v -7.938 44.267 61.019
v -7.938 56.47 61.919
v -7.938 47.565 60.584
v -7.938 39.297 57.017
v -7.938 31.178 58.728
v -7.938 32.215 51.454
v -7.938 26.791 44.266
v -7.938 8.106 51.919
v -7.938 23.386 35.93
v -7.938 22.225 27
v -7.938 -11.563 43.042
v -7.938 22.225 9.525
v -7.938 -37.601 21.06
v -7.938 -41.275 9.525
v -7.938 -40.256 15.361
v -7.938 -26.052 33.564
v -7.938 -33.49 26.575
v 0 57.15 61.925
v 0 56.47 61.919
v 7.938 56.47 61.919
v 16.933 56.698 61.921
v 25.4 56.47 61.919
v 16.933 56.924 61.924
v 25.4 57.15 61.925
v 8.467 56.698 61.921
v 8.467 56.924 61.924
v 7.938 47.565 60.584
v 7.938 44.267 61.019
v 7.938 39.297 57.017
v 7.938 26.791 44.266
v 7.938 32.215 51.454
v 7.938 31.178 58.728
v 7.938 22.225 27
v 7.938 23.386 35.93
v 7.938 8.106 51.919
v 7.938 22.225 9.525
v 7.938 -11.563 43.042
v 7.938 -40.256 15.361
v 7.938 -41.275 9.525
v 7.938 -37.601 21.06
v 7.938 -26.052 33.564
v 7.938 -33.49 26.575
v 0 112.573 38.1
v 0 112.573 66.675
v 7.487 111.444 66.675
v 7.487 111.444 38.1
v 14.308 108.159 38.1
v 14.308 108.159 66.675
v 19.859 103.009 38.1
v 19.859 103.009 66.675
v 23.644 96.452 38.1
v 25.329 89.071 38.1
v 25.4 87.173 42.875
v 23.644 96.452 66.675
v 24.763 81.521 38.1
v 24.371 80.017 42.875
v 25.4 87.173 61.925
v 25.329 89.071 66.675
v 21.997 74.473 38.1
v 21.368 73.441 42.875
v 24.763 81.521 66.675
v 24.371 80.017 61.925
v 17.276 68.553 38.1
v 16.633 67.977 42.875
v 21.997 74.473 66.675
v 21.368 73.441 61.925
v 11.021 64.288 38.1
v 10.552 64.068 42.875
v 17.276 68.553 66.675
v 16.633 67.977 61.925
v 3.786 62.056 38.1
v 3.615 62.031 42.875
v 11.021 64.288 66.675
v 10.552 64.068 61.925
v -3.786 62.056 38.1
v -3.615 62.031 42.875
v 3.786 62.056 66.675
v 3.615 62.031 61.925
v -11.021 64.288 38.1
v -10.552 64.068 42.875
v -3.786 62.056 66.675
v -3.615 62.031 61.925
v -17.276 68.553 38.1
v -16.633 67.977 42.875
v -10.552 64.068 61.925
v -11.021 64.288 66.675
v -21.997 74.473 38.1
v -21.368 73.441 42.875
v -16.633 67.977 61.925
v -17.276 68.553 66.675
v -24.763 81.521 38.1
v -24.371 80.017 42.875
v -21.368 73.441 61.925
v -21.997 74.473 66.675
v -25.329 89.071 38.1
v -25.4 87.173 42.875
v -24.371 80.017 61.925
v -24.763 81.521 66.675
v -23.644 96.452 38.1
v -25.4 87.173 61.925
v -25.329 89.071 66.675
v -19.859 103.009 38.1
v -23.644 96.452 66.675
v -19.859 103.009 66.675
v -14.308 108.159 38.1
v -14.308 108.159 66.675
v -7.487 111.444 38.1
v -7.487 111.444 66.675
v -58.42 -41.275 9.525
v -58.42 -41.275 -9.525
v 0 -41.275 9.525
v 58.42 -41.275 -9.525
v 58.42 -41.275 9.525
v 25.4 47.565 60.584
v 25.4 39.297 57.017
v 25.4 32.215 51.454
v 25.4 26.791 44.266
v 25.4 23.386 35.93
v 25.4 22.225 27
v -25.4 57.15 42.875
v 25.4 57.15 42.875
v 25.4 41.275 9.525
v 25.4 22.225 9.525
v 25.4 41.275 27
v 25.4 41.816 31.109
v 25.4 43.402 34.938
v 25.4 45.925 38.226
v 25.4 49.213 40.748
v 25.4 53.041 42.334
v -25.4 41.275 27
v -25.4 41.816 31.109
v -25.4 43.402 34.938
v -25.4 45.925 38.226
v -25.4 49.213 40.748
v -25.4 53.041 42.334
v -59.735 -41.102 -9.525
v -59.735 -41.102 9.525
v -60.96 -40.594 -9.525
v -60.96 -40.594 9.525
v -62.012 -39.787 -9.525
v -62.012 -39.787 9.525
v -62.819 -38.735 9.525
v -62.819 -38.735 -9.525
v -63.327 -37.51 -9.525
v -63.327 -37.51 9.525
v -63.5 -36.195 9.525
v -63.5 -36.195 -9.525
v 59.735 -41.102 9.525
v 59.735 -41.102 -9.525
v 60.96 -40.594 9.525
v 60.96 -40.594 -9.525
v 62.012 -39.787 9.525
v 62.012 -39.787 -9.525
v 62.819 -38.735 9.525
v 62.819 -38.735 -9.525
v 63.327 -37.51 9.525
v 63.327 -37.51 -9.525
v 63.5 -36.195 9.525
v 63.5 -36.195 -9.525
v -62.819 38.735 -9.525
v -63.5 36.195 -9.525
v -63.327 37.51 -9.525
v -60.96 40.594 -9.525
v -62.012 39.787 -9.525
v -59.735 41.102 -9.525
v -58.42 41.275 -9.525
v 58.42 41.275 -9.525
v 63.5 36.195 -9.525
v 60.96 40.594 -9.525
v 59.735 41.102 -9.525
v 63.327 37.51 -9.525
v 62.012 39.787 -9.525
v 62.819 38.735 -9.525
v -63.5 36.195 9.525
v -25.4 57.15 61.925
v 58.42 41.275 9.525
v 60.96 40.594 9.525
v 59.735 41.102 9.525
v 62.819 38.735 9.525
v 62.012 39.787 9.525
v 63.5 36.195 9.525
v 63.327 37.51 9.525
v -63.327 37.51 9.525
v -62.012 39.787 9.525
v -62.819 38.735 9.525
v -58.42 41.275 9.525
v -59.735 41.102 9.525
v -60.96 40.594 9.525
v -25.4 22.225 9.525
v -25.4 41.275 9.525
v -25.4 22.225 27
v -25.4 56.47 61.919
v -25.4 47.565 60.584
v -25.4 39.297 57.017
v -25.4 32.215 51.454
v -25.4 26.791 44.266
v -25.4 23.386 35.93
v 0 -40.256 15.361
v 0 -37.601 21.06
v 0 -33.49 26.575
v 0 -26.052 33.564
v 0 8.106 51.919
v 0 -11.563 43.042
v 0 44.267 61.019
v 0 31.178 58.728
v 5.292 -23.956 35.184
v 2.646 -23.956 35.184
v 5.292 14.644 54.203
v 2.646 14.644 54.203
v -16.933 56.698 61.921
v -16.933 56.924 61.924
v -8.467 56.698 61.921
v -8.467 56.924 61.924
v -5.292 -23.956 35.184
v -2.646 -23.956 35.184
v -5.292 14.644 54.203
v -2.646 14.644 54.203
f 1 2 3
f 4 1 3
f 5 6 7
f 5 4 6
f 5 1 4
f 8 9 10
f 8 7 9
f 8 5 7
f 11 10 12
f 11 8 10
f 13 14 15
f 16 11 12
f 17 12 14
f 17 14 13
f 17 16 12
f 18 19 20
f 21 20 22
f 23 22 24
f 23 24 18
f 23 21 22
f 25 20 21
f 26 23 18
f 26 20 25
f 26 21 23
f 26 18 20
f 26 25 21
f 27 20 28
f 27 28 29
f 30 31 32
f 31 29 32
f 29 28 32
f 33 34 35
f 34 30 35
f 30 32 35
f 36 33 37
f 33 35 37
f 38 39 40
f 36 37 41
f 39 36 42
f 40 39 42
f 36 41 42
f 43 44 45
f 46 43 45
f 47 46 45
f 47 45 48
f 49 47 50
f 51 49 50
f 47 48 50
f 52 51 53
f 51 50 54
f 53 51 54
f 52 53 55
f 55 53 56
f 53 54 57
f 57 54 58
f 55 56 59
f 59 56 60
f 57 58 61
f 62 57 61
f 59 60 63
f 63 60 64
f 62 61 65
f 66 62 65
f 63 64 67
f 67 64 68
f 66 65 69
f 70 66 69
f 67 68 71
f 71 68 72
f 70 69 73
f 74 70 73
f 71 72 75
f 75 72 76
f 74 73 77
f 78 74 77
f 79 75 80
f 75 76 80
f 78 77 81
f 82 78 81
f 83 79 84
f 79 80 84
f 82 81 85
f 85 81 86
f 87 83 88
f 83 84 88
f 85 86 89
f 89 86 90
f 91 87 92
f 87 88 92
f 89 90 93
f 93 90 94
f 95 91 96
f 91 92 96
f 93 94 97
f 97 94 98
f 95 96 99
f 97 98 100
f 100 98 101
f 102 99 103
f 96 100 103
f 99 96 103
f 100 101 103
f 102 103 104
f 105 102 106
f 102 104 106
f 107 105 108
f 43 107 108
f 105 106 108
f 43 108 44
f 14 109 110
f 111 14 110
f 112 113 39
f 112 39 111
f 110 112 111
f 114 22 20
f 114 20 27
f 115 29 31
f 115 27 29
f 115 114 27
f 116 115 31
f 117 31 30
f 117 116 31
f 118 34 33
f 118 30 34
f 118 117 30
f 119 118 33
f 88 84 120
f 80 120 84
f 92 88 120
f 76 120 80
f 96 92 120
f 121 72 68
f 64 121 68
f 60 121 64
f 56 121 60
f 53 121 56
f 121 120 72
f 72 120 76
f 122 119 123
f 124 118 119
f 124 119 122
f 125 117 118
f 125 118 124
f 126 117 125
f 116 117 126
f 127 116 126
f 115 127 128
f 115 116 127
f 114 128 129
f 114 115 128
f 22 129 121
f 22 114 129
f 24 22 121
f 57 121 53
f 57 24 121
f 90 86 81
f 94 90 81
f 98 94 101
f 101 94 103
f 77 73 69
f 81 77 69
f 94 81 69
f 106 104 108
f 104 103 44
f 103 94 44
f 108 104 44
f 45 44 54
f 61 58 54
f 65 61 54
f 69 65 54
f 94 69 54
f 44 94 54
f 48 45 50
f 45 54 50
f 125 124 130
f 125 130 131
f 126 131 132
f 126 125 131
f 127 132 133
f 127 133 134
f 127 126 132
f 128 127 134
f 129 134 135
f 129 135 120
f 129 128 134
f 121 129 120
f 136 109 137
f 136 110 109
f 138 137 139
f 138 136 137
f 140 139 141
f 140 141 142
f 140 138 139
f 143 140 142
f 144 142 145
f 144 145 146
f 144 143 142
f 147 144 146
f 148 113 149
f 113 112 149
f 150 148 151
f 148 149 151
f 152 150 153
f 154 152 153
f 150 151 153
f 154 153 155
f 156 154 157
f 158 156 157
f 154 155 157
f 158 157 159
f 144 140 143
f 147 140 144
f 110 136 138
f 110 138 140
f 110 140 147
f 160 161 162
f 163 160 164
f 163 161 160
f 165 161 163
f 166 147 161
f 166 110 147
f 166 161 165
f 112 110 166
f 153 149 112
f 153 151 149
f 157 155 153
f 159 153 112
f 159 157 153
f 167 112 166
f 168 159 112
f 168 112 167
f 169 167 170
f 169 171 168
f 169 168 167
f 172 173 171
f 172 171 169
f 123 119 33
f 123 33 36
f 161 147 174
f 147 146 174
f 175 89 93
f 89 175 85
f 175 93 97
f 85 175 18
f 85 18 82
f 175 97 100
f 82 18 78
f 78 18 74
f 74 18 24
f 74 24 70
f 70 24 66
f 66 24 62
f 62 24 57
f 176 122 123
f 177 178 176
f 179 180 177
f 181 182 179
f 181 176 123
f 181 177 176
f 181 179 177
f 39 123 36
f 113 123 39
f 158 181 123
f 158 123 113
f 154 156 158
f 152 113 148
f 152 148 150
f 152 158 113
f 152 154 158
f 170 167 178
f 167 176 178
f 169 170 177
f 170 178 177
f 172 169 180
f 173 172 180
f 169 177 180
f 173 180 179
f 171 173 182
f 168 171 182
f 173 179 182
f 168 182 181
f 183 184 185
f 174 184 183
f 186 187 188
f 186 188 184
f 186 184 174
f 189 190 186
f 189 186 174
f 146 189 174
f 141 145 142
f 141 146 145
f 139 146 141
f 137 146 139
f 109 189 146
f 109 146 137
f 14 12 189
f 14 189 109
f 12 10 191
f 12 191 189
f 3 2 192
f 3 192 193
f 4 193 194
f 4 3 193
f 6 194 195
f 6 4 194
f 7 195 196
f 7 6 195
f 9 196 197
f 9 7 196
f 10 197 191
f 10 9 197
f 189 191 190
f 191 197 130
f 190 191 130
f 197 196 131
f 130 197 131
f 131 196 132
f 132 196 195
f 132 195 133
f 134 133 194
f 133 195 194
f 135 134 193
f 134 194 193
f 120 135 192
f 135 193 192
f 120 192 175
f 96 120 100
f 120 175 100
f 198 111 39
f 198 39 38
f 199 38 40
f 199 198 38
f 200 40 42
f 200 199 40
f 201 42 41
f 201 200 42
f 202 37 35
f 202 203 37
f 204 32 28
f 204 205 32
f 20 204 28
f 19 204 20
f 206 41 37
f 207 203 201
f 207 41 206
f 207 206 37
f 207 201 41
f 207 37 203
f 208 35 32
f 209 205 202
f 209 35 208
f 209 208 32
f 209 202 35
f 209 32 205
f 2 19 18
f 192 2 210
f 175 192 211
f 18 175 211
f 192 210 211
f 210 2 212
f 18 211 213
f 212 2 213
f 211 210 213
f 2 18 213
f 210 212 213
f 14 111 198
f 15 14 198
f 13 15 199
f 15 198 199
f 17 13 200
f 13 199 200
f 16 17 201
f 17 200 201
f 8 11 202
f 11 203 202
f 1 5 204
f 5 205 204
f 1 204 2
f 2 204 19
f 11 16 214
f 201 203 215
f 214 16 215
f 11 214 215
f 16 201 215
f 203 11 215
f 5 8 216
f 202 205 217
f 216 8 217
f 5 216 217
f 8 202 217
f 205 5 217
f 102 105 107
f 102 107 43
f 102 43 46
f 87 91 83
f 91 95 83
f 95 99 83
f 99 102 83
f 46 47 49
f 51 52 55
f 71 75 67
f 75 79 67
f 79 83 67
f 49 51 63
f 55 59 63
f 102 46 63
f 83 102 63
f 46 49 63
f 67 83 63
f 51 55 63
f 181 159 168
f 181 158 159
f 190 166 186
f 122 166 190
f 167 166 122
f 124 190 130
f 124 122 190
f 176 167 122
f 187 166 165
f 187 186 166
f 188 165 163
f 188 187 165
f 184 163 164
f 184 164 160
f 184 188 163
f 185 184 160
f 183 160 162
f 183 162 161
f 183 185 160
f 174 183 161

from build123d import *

# Parameters (mm, degrees)
F1_DEPTH = 63.5
F2_DEPTH = 25.4
F3_DEPTH = 7.9375
F0_W     = 25.4
F0_H     = 19.05
F4_DEPTH = 25.4
F6_R     = 5.08


with BuildPart() as f1:
    # F0 (on Right) → F1 (new body, symmetric)
    with BuildSketch(Plane.YZ):
        Polygon((22.225, 9.525), (-41.275, 9.525), (-41.275, -9.525), (41.275, -9.525), (41.275, 9.525), align=None)
    extrude(amount=F1_DEPTH, both=True)

    # F0 (on Right) → F2 (join, symmetric)
    with BuildSketch(Plane.YZ):
        with BuildLine():
            Line((22.225, 27.0002), (22.225, 9.525))
            Line((22.225, 9.525), (41.275, 9.525))
            Line((41.275, 9.525), (41.275, 27.0002))
            ThreePointArc((41.275, 27.0002), (45.9246798487, 38.2255201513), (57.15, 42.8752))
            Line((57.15, 42.8752), (61.7728, 42.8752))
            Line((61.7728, 42.8752), (61.7728, 61.9252))
            Line((61.7728, 61.9252), (57.15, 61.9252))
            add(Edge.make_bspline(
                [(56.4704910637, 61.9185890322), (56.6978208401, 61.9216781998), (56.9243298896, 61.9238834244), (57.15, 61.9252)],
                knots=[110.8312649527, 110.8312649527, 110.8312649527, 110.8312649527, 111.5045361635, 111.5045361635, 111.5045361635, 111.5045361635], degree=3))
            ThreePointArc((56.4704910637, 61.9185890322), (32.2152103017, 51.4544815822), (22.225, 27.0002))
        make_face()
    extrude(amount=F2_DEPTH, both=True)

    # F0 (on Right) → F3 (join, symmetric)
    with BuildSketch(Plane.YZ):
        with BuildLine():
            add(Edge.make_bspline(
                [(-41.275, 9.525), (-40.6142083443, 36.9480472053), (19.0483552666, 61.4100623809), (56.4704910637, 61.9185890322)],
                knots=[0, 0, 0, 0, 110.8312649527, 110.8312649527, 110.8312649527, 110.8312649527], degree=3))
            Line((-41.275, 9.525), (22.225, 9.525))
            Line((22.225, 9.525), (22.225, 27.0002))
            ThreePointArc((22.225, 27.0002), (32.2152103017, 51.4544815822), (56.4704910637, 61.9185890322))
        make_face()
    extrude(amount=F3_DEPTH, both=True)

    # F0 (on Right) → F4 (join, symmetric)
    with BuildSketch(Plane.YZ):
        with Locations((74.4728, 52.4002)):
            Rectangle(F0_W, F0_H)
    extrude(amount=F4_DEPTH, both=True)

    # F0 (on Right) → F5 (revolve)
    with BuildSketch(Plane.YZ):
        Polygon((87.1728, 66.675), (87.1728, 61.9252), (87.1728, 42.8752), (87.1728, 38.1), (112.5728, 38.1), (112.5728, 66.675), align=None)
    revolve(axis=Axis((0, 87.1728, 52.3875), (0, 0, -1)))

    # F6
    f6_edges = [f1.edges().sort_by_distance(p)[0] for p in [
        (63.5, -41.275, 0),
        (63.5, 41.275, 0),
        (-63.5, 41.275, 0),
        (-63.5, -41.275, 0),
    ]]
    fillet(f6_edges, radius=F6_R)


solid = f1.part
